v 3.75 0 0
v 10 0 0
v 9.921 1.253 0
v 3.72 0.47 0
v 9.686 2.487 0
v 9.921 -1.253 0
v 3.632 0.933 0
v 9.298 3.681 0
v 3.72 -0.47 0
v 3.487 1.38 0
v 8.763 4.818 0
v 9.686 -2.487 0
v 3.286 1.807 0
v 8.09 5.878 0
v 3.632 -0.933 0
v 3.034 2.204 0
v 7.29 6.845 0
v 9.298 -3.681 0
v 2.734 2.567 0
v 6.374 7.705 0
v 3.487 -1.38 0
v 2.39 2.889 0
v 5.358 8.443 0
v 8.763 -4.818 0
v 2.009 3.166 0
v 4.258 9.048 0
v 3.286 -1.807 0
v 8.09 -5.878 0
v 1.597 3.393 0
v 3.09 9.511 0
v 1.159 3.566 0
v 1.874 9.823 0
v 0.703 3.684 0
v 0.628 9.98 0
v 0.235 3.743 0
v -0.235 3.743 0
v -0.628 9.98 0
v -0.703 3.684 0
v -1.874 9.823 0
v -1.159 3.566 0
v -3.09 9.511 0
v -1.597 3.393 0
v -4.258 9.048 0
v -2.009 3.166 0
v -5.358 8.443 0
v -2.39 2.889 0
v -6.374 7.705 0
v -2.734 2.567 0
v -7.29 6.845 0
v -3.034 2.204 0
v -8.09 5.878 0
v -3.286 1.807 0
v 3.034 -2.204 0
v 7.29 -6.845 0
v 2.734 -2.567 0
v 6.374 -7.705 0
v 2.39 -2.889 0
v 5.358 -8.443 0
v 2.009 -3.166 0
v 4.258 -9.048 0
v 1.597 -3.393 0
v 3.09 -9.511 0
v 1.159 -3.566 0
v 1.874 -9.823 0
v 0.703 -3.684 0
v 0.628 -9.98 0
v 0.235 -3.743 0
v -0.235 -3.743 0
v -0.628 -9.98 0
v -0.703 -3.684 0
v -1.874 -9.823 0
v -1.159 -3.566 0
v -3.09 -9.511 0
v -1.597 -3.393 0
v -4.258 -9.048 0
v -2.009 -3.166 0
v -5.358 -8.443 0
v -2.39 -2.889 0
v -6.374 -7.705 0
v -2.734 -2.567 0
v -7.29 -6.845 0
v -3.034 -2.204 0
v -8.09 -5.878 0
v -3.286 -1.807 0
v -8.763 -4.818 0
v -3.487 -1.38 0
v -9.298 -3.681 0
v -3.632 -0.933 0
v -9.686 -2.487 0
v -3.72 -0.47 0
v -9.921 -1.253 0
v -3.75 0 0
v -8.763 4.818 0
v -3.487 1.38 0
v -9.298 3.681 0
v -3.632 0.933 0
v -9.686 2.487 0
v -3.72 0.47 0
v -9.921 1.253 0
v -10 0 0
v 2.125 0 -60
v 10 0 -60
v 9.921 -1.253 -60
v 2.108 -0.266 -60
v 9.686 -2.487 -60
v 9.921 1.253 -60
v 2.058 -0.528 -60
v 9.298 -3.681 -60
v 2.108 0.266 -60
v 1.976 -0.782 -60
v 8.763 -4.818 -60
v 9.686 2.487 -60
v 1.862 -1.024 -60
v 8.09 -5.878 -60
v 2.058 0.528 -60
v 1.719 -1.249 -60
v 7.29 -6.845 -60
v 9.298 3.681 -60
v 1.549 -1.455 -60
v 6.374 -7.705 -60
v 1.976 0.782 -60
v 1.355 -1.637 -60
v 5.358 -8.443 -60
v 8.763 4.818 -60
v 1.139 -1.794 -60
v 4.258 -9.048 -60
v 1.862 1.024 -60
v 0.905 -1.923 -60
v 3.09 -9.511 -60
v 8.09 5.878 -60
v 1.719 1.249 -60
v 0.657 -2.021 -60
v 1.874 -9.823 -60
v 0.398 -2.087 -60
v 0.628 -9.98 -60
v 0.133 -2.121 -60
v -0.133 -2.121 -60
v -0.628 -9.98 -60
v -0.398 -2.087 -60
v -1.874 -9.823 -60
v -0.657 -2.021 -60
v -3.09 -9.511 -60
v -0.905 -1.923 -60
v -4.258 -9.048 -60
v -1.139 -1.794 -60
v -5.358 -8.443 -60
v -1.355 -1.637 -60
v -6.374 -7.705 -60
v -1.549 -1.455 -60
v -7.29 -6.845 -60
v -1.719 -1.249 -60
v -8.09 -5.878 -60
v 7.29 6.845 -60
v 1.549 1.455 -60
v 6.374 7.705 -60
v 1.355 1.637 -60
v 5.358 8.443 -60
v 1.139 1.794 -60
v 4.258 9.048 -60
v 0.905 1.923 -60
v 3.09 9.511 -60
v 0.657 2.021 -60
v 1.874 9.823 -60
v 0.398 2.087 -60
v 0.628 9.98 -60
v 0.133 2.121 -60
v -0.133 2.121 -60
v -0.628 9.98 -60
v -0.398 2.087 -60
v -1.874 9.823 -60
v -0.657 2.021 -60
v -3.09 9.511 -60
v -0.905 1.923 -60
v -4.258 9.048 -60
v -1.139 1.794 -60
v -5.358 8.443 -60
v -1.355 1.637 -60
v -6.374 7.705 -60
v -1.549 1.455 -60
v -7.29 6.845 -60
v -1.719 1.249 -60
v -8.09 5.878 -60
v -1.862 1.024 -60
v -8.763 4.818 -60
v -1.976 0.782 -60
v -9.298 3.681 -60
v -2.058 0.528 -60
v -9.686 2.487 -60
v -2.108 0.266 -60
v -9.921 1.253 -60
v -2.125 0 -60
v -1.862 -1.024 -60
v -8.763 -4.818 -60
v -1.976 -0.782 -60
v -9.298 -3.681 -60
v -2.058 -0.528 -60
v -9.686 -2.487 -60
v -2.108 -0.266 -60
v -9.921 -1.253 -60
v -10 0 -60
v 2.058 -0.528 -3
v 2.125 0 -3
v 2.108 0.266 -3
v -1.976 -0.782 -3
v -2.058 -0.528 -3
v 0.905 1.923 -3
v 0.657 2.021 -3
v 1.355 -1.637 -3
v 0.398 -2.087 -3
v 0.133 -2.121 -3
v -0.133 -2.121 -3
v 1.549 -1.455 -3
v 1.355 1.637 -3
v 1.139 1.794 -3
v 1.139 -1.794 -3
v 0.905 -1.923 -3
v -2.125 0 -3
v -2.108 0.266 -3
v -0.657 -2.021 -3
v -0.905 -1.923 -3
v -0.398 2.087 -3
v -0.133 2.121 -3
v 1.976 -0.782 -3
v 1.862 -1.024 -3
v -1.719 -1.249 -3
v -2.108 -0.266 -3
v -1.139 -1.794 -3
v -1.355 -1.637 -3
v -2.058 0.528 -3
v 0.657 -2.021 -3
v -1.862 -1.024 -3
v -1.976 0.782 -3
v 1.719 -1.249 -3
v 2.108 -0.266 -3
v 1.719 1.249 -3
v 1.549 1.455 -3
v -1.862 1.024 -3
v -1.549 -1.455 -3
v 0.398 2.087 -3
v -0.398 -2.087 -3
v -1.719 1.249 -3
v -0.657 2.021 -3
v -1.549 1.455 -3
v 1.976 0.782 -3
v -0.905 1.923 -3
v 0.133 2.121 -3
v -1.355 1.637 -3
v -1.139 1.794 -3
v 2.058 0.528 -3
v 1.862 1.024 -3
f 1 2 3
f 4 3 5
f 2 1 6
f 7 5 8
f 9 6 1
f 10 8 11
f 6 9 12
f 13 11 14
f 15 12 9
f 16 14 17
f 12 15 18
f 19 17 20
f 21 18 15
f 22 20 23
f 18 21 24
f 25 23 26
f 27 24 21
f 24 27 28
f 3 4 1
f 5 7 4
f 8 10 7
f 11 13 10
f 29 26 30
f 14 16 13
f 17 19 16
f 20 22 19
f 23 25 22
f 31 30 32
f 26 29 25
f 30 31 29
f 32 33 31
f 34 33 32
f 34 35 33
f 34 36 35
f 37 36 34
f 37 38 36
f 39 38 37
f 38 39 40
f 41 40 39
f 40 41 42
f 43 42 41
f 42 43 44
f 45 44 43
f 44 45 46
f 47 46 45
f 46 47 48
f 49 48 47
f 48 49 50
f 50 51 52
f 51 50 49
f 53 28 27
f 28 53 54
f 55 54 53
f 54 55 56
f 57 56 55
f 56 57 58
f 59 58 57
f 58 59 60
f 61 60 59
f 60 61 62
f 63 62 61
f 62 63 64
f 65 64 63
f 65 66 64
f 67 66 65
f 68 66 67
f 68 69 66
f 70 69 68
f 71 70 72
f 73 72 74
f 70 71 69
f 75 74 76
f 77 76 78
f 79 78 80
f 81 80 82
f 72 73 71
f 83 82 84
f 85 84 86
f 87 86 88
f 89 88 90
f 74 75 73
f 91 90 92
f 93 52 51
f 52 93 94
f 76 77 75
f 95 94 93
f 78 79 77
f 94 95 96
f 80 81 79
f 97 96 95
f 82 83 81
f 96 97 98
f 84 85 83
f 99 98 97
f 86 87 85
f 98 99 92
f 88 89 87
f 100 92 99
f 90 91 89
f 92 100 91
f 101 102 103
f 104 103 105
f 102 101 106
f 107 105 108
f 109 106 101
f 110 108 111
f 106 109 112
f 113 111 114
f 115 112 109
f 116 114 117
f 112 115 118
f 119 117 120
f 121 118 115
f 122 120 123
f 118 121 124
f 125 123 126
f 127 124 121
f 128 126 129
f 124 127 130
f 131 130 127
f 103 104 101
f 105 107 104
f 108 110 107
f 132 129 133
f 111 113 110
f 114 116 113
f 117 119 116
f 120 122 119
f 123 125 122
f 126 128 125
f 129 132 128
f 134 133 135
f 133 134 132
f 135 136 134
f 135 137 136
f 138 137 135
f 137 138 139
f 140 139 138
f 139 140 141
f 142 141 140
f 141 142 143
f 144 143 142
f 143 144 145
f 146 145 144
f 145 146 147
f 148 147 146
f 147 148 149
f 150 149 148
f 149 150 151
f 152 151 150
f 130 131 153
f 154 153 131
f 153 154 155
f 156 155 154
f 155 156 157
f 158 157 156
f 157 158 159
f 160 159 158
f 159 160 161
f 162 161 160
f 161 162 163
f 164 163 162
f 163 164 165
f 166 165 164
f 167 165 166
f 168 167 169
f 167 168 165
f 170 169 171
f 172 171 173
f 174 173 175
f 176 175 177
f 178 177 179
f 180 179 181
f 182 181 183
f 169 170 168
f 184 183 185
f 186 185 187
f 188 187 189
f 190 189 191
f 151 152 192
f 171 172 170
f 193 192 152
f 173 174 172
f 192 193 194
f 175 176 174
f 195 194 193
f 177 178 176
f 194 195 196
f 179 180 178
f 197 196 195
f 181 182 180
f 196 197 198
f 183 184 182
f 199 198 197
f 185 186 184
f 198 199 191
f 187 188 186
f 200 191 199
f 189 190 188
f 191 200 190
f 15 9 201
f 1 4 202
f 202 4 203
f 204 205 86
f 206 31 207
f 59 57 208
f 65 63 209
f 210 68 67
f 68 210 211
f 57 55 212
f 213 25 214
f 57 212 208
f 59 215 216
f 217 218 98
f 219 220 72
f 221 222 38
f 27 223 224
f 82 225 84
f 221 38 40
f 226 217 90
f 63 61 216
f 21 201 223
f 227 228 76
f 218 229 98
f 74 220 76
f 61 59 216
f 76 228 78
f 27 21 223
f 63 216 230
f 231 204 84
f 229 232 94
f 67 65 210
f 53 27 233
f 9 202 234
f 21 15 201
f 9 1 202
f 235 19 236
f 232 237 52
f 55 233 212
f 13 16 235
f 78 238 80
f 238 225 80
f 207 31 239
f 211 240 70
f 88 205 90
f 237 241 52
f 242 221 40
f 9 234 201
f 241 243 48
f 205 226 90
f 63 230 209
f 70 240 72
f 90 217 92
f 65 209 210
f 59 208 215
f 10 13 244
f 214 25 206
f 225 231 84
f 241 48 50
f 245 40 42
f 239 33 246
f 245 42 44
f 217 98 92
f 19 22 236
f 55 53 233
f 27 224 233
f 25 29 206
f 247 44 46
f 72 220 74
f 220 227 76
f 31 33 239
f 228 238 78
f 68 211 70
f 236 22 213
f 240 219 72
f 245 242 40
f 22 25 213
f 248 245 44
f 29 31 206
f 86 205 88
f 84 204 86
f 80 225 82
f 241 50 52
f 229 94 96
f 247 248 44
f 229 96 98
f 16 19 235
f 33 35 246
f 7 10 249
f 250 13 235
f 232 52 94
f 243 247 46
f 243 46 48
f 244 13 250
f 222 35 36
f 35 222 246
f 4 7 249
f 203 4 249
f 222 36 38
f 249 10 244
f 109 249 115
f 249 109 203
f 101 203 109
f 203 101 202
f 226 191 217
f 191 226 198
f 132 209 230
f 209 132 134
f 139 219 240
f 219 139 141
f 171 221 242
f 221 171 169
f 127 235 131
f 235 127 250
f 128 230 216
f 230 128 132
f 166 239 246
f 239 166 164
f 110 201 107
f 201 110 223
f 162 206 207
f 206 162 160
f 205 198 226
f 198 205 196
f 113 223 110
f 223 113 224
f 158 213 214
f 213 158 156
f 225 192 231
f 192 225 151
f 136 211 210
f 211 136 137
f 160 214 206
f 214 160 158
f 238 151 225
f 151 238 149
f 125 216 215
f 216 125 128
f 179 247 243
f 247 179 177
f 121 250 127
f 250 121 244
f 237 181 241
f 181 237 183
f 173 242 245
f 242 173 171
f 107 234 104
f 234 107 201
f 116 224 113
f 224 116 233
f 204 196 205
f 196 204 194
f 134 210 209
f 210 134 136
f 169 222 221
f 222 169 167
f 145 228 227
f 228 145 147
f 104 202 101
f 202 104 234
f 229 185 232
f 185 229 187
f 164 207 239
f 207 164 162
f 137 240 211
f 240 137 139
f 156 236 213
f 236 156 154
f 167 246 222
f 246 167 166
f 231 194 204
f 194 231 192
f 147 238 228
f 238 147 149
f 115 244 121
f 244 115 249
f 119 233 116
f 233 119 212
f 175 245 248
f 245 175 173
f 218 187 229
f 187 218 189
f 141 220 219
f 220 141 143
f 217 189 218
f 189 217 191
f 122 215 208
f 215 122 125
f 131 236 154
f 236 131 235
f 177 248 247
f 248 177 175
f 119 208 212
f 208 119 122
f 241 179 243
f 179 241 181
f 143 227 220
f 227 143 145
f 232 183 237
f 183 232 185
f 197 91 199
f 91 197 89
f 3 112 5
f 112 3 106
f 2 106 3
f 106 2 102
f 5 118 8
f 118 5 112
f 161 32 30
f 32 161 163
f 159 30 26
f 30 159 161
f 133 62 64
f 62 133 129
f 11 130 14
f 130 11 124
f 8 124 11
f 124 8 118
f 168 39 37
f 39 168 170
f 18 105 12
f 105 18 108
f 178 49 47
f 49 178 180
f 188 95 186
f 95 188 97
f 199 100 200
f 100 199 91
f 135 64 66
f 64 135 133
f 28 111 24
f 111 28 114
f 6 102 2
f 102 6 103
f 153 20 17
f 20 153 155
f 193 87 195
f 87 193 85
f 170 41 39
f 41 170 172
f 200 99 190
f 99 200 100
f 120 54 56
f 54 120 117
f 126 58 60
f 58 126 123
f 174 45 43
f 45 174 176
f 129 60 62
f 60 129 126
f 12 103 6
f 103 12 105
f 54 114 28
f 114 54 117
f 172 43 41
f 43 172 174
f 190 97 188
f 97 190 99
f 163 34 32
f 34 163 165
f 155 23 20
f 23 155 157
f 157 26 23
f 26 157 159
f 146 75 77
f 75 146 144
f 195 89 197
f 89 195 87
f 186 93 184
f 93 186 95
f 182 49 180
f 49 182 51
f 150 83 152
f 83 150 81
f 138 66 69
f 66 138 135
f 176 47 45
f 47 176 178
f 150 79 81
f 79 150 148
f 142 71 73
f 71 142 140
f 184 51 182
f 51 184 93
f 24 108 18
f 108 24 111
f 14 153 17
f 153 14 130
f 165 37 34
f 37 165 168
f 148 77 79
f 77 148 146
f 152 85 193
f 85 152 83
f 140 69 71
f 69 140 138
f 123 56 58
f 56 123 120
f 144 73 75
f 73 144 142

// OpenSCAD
$fn = 50;


difference() {
	union() {
		translate(v = [0, 0, -60.0000000000]) {
			cylinder(h = 60, r = 10.0000000000);
		}
		cylinder(h = 0, r = 20.0000000000);
	}
	union() {
		translate(v = [0, 0, 0]) {
			rotate(a = [0, 0, 0]) {
				difference() {
					union() {
						#translate(v = [0, 0, -60.0000000000]) {
							cylinder(h = 60, r = 2.0000000000);
						}
						#translate(v = [0, 0, -3]) {
							cylinder(h = 3, r1 = 2.1250000000, r2 = 3.7500000000);
						}
						#translate(v = [0, 0, -60.0000000000]) {
							cylinder(h = 60, r = 2.1250000000);
						}
						#translate(v = [0, 0, -60.0000000000]) {
							cylinder(h = 60, r = 2.0000000000);
						}
					}
					union();
				}
			}
		}
	}
}
